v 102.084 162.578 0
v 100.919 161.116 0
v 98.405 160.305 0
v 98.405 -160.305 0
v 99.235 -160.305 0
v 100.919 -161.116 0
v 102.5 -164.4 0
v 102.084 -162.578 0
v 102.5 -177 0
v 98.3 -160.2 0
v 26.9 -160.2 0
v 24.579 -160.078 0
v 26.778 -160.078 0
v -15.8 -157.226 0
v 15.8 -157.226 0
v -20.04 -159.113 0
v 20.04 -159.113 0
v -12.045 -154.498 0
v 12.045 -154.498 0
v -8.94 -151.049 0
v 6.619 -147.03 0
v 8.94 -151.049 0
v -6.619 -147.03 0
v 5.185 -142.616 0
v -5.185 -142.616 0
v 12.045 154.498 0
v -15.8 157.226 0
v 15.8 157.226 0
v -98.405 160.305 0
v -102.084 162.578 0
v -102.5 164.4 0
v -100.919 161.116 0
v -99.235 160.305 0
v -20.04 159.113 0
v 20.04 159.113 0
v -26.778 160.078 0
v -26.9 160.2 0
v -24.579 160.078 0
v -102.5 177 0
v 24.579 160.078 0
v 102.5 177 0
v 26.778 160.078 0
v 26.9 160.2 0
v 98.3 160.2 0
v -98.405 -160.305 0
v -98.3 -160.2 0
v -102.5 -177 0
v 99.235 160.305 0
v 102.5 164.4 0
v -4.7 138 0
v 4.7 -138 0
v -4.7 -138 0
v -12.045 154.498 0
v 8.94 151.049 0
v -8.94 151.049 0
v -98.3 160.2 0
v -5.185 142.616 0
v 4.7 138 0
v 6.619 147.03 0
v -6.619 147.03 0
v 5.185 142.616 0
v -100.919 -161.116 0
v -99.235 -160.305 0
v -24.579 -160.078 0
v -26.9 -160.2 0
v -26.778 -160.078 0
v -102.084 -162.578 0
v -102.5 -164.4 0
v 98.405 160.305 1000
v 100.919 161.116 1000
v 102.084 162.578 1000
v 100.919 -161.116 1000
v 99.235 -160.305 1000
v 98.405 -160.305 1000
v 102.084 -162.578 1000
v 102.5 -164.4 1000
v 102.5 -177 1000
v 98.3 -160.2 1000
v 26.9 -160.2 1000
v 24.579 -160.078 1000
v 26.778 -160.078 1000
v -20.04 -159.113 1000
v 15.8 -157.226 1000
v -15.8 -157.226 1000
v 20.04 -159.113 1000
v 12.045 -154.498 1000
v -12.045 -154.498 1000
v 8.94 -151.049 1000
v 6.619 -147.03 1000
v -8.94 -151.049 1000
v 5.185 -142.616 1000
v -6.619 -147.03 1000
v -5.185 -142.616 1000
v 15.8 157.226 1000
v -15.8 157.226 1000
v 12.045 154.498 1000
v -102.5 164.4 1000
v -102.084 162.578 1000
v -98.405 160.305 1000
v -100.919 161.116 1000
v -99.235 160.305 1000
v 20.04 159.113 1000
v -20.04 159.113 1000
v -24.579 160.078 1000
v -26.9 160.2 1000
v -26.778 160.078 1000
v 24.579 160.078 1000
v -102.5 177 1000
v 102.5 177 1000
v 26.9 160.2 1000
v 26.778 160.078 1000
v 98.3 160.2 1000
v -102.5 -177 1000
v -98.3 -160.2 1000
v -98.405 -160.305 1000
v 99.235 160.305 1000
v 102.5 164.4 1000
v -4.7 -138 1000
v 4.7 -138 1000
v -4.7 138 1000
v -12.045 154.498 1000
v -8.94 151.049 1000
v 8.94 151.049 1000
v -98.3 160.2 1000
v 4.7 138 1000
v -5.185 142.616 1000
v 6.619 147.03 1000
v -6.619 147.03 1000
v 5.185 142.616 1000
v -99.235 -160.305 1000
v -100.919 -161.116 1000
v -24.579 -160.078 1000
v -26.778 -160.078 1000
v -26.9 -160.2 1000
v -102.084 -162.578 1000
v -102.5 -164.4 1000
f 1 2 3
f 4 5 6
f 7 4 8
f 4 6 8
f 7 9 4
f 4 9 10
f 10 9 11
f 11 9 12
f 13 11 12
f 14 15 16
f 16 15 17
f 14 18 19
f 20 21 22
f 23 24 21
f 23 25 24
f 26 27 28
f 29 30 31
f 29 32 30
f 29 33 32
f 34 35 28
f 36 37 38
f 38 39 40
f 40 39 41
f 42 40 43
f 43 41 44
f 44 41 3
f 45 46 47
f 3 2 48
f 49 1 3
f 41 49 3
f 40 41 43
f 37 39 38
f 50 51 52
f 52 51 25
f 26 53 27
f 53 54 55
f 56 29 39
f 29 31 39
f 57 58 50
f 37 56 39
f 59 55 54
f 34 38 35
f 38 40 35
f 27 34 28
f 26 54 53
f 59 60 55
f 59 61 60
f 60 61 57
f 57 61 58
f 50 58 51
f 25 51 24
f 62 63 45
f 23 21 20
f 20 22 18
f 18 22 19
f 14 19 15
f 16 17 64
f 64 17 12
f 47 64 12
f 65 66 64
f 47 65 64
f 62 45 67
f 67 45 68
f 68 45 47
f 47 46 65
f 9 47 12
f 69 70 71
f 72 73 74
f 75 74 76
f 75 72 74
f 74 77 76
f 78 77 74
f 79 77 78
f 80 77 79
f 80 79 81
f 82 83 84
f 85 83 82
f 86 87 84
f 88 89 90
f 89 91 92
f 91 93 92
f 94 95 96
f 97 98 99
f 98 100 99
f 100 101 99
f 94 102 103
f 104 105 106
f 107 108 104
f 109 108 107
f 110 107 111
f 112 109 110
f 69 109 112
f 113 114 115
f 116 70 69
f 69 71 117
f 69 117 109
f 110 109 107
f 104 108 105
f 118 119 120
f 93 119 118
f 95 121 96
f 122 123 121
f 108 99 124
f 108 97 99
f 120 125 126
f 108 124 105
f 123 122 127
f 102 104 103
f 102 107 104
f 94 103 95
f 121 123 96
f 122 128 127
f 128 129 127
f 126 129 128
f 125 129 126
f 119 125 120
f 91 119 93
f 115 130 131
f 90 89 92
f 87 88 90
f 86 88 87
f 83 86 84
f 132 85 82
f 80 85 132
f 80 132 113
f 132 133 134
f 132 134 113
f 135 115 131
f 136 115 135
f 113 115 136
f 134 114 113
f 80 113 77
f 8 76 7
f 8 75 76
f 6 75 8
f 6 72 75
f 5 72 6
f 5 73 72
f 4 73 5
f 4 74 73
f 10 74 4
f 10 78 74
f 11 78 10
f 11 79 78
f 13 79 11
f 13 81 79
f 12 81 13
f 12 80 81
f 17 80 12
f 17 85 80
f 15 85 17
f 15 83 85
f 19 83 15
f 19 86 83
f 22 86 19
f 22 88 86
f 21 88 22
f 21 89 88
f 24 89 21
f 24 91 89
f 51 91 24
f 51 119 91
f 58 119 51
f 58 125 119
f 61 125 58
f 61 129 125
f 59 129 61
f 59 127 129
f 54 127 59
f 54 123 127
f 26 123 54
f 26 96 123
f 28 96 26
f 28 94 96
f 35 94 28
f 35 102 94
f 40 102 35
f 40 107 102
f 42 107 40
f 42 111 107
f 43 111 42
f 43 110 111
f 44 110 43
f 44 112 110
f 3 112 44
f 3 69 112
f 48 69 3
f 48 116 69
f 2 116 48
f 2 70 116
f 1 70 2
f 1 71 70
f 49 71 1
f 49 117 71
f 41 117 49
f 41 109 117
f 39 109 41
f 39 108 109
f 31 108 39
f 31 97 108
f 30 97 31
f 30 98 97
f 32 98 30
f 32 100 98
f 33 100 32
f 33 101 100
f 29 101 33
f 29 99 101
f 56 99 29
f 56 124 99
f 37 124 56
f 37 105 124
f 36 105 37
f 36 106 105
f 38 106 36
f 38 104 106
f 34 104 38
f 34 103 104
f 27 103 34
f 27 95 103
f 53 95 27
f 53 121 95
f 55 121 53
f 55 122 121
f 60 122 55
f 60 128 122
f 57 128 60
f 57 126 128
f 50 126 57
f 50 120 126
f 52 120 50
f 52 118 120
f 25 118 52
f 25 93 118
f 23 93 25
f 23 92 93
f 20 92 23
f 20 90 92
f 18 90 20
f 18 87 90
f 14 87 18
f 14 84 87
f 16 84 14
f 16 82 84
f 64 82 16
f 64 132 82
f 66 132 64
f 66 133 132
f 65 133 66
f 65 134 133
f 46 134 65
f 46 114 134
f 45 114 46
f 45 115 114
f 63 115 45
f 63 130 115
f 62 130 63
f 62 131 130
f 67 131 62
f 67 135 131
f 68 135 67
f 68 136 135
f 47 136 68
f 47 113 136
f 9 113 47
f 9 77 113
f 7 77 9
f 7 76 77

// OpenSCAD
module W(d,b,t,w,l=300,k=undef,r2=undef) {
    k = k==undef ? 2.25*t : k; 
    r1 = k - t;     // radius of web to flange fillet.
    r2 = r2==undef ? t/4 : r2;    // radius of inside flange tip fillet
    b2 = b/2;
    d2 = d/2;
    w2 = w/2;
    pts = [ [-b2,-d2],   // 0 - top left flange tip
                [-b2,-d2+(t-r2)],   // 1
                [-b2+r2,-d2+t],
                [-w2-r1,-d2+t],  // 3
                [-w2,-d2+t+r1],
                [-w2,d2-t-r1],      // 5
                [-w2-r1,d2-t],
                [-b2+r2,d2-t],     // 7
                [-b2,d2-(t-r2)],
                [-b2,d2],             // 9
                [b2,d2],             // 10
                [b2,d2-(t-r2)],
                [b2-r2,d2-t],     // 12
                [w2+r1,d2-t],
                [w2,d2-t-r1],      // 14
                [w2,-d2+t+r1],
                [w2+r1,-d2+t],  // 16
                [b2-r2,-d2+t],
                [b2,-d2+(t-r2)],   // 18
                [b2,-d2]   // 19 - top right flange tip
               ];
    linear_extrude(height=l) {
        difference() {
            union() {
                polygon(pts);
                translate([-b2+r2,-d2+t-r2,0]) { circle(r=r2); }
                translate([b2-r2,-d2+t-r2,0]) { circle(r=r2); }
                translate([-b2+r2,d2-t+r2,0]) { circle(r=r2); }
                translate([b2-r2,d2-t+r2,0]) { circle(r=r2); }
            }
            translate([-w2-r1,-d2+t+r1,0]) {circle(r=r1);}
            translate([w2+r1,-d2+t+r1,0]) {circle(r=r1);}
            translate([-w2-r1,d2-t-r1,0]) {circle(r=r1);}
            translate([w2+r1,d2-t-r1,0]) {circle(r=r1);}
        }
    }
}

render()  {
    W(354,205,16.8,9.4,k=39,l=1000);  // W360x79
}
